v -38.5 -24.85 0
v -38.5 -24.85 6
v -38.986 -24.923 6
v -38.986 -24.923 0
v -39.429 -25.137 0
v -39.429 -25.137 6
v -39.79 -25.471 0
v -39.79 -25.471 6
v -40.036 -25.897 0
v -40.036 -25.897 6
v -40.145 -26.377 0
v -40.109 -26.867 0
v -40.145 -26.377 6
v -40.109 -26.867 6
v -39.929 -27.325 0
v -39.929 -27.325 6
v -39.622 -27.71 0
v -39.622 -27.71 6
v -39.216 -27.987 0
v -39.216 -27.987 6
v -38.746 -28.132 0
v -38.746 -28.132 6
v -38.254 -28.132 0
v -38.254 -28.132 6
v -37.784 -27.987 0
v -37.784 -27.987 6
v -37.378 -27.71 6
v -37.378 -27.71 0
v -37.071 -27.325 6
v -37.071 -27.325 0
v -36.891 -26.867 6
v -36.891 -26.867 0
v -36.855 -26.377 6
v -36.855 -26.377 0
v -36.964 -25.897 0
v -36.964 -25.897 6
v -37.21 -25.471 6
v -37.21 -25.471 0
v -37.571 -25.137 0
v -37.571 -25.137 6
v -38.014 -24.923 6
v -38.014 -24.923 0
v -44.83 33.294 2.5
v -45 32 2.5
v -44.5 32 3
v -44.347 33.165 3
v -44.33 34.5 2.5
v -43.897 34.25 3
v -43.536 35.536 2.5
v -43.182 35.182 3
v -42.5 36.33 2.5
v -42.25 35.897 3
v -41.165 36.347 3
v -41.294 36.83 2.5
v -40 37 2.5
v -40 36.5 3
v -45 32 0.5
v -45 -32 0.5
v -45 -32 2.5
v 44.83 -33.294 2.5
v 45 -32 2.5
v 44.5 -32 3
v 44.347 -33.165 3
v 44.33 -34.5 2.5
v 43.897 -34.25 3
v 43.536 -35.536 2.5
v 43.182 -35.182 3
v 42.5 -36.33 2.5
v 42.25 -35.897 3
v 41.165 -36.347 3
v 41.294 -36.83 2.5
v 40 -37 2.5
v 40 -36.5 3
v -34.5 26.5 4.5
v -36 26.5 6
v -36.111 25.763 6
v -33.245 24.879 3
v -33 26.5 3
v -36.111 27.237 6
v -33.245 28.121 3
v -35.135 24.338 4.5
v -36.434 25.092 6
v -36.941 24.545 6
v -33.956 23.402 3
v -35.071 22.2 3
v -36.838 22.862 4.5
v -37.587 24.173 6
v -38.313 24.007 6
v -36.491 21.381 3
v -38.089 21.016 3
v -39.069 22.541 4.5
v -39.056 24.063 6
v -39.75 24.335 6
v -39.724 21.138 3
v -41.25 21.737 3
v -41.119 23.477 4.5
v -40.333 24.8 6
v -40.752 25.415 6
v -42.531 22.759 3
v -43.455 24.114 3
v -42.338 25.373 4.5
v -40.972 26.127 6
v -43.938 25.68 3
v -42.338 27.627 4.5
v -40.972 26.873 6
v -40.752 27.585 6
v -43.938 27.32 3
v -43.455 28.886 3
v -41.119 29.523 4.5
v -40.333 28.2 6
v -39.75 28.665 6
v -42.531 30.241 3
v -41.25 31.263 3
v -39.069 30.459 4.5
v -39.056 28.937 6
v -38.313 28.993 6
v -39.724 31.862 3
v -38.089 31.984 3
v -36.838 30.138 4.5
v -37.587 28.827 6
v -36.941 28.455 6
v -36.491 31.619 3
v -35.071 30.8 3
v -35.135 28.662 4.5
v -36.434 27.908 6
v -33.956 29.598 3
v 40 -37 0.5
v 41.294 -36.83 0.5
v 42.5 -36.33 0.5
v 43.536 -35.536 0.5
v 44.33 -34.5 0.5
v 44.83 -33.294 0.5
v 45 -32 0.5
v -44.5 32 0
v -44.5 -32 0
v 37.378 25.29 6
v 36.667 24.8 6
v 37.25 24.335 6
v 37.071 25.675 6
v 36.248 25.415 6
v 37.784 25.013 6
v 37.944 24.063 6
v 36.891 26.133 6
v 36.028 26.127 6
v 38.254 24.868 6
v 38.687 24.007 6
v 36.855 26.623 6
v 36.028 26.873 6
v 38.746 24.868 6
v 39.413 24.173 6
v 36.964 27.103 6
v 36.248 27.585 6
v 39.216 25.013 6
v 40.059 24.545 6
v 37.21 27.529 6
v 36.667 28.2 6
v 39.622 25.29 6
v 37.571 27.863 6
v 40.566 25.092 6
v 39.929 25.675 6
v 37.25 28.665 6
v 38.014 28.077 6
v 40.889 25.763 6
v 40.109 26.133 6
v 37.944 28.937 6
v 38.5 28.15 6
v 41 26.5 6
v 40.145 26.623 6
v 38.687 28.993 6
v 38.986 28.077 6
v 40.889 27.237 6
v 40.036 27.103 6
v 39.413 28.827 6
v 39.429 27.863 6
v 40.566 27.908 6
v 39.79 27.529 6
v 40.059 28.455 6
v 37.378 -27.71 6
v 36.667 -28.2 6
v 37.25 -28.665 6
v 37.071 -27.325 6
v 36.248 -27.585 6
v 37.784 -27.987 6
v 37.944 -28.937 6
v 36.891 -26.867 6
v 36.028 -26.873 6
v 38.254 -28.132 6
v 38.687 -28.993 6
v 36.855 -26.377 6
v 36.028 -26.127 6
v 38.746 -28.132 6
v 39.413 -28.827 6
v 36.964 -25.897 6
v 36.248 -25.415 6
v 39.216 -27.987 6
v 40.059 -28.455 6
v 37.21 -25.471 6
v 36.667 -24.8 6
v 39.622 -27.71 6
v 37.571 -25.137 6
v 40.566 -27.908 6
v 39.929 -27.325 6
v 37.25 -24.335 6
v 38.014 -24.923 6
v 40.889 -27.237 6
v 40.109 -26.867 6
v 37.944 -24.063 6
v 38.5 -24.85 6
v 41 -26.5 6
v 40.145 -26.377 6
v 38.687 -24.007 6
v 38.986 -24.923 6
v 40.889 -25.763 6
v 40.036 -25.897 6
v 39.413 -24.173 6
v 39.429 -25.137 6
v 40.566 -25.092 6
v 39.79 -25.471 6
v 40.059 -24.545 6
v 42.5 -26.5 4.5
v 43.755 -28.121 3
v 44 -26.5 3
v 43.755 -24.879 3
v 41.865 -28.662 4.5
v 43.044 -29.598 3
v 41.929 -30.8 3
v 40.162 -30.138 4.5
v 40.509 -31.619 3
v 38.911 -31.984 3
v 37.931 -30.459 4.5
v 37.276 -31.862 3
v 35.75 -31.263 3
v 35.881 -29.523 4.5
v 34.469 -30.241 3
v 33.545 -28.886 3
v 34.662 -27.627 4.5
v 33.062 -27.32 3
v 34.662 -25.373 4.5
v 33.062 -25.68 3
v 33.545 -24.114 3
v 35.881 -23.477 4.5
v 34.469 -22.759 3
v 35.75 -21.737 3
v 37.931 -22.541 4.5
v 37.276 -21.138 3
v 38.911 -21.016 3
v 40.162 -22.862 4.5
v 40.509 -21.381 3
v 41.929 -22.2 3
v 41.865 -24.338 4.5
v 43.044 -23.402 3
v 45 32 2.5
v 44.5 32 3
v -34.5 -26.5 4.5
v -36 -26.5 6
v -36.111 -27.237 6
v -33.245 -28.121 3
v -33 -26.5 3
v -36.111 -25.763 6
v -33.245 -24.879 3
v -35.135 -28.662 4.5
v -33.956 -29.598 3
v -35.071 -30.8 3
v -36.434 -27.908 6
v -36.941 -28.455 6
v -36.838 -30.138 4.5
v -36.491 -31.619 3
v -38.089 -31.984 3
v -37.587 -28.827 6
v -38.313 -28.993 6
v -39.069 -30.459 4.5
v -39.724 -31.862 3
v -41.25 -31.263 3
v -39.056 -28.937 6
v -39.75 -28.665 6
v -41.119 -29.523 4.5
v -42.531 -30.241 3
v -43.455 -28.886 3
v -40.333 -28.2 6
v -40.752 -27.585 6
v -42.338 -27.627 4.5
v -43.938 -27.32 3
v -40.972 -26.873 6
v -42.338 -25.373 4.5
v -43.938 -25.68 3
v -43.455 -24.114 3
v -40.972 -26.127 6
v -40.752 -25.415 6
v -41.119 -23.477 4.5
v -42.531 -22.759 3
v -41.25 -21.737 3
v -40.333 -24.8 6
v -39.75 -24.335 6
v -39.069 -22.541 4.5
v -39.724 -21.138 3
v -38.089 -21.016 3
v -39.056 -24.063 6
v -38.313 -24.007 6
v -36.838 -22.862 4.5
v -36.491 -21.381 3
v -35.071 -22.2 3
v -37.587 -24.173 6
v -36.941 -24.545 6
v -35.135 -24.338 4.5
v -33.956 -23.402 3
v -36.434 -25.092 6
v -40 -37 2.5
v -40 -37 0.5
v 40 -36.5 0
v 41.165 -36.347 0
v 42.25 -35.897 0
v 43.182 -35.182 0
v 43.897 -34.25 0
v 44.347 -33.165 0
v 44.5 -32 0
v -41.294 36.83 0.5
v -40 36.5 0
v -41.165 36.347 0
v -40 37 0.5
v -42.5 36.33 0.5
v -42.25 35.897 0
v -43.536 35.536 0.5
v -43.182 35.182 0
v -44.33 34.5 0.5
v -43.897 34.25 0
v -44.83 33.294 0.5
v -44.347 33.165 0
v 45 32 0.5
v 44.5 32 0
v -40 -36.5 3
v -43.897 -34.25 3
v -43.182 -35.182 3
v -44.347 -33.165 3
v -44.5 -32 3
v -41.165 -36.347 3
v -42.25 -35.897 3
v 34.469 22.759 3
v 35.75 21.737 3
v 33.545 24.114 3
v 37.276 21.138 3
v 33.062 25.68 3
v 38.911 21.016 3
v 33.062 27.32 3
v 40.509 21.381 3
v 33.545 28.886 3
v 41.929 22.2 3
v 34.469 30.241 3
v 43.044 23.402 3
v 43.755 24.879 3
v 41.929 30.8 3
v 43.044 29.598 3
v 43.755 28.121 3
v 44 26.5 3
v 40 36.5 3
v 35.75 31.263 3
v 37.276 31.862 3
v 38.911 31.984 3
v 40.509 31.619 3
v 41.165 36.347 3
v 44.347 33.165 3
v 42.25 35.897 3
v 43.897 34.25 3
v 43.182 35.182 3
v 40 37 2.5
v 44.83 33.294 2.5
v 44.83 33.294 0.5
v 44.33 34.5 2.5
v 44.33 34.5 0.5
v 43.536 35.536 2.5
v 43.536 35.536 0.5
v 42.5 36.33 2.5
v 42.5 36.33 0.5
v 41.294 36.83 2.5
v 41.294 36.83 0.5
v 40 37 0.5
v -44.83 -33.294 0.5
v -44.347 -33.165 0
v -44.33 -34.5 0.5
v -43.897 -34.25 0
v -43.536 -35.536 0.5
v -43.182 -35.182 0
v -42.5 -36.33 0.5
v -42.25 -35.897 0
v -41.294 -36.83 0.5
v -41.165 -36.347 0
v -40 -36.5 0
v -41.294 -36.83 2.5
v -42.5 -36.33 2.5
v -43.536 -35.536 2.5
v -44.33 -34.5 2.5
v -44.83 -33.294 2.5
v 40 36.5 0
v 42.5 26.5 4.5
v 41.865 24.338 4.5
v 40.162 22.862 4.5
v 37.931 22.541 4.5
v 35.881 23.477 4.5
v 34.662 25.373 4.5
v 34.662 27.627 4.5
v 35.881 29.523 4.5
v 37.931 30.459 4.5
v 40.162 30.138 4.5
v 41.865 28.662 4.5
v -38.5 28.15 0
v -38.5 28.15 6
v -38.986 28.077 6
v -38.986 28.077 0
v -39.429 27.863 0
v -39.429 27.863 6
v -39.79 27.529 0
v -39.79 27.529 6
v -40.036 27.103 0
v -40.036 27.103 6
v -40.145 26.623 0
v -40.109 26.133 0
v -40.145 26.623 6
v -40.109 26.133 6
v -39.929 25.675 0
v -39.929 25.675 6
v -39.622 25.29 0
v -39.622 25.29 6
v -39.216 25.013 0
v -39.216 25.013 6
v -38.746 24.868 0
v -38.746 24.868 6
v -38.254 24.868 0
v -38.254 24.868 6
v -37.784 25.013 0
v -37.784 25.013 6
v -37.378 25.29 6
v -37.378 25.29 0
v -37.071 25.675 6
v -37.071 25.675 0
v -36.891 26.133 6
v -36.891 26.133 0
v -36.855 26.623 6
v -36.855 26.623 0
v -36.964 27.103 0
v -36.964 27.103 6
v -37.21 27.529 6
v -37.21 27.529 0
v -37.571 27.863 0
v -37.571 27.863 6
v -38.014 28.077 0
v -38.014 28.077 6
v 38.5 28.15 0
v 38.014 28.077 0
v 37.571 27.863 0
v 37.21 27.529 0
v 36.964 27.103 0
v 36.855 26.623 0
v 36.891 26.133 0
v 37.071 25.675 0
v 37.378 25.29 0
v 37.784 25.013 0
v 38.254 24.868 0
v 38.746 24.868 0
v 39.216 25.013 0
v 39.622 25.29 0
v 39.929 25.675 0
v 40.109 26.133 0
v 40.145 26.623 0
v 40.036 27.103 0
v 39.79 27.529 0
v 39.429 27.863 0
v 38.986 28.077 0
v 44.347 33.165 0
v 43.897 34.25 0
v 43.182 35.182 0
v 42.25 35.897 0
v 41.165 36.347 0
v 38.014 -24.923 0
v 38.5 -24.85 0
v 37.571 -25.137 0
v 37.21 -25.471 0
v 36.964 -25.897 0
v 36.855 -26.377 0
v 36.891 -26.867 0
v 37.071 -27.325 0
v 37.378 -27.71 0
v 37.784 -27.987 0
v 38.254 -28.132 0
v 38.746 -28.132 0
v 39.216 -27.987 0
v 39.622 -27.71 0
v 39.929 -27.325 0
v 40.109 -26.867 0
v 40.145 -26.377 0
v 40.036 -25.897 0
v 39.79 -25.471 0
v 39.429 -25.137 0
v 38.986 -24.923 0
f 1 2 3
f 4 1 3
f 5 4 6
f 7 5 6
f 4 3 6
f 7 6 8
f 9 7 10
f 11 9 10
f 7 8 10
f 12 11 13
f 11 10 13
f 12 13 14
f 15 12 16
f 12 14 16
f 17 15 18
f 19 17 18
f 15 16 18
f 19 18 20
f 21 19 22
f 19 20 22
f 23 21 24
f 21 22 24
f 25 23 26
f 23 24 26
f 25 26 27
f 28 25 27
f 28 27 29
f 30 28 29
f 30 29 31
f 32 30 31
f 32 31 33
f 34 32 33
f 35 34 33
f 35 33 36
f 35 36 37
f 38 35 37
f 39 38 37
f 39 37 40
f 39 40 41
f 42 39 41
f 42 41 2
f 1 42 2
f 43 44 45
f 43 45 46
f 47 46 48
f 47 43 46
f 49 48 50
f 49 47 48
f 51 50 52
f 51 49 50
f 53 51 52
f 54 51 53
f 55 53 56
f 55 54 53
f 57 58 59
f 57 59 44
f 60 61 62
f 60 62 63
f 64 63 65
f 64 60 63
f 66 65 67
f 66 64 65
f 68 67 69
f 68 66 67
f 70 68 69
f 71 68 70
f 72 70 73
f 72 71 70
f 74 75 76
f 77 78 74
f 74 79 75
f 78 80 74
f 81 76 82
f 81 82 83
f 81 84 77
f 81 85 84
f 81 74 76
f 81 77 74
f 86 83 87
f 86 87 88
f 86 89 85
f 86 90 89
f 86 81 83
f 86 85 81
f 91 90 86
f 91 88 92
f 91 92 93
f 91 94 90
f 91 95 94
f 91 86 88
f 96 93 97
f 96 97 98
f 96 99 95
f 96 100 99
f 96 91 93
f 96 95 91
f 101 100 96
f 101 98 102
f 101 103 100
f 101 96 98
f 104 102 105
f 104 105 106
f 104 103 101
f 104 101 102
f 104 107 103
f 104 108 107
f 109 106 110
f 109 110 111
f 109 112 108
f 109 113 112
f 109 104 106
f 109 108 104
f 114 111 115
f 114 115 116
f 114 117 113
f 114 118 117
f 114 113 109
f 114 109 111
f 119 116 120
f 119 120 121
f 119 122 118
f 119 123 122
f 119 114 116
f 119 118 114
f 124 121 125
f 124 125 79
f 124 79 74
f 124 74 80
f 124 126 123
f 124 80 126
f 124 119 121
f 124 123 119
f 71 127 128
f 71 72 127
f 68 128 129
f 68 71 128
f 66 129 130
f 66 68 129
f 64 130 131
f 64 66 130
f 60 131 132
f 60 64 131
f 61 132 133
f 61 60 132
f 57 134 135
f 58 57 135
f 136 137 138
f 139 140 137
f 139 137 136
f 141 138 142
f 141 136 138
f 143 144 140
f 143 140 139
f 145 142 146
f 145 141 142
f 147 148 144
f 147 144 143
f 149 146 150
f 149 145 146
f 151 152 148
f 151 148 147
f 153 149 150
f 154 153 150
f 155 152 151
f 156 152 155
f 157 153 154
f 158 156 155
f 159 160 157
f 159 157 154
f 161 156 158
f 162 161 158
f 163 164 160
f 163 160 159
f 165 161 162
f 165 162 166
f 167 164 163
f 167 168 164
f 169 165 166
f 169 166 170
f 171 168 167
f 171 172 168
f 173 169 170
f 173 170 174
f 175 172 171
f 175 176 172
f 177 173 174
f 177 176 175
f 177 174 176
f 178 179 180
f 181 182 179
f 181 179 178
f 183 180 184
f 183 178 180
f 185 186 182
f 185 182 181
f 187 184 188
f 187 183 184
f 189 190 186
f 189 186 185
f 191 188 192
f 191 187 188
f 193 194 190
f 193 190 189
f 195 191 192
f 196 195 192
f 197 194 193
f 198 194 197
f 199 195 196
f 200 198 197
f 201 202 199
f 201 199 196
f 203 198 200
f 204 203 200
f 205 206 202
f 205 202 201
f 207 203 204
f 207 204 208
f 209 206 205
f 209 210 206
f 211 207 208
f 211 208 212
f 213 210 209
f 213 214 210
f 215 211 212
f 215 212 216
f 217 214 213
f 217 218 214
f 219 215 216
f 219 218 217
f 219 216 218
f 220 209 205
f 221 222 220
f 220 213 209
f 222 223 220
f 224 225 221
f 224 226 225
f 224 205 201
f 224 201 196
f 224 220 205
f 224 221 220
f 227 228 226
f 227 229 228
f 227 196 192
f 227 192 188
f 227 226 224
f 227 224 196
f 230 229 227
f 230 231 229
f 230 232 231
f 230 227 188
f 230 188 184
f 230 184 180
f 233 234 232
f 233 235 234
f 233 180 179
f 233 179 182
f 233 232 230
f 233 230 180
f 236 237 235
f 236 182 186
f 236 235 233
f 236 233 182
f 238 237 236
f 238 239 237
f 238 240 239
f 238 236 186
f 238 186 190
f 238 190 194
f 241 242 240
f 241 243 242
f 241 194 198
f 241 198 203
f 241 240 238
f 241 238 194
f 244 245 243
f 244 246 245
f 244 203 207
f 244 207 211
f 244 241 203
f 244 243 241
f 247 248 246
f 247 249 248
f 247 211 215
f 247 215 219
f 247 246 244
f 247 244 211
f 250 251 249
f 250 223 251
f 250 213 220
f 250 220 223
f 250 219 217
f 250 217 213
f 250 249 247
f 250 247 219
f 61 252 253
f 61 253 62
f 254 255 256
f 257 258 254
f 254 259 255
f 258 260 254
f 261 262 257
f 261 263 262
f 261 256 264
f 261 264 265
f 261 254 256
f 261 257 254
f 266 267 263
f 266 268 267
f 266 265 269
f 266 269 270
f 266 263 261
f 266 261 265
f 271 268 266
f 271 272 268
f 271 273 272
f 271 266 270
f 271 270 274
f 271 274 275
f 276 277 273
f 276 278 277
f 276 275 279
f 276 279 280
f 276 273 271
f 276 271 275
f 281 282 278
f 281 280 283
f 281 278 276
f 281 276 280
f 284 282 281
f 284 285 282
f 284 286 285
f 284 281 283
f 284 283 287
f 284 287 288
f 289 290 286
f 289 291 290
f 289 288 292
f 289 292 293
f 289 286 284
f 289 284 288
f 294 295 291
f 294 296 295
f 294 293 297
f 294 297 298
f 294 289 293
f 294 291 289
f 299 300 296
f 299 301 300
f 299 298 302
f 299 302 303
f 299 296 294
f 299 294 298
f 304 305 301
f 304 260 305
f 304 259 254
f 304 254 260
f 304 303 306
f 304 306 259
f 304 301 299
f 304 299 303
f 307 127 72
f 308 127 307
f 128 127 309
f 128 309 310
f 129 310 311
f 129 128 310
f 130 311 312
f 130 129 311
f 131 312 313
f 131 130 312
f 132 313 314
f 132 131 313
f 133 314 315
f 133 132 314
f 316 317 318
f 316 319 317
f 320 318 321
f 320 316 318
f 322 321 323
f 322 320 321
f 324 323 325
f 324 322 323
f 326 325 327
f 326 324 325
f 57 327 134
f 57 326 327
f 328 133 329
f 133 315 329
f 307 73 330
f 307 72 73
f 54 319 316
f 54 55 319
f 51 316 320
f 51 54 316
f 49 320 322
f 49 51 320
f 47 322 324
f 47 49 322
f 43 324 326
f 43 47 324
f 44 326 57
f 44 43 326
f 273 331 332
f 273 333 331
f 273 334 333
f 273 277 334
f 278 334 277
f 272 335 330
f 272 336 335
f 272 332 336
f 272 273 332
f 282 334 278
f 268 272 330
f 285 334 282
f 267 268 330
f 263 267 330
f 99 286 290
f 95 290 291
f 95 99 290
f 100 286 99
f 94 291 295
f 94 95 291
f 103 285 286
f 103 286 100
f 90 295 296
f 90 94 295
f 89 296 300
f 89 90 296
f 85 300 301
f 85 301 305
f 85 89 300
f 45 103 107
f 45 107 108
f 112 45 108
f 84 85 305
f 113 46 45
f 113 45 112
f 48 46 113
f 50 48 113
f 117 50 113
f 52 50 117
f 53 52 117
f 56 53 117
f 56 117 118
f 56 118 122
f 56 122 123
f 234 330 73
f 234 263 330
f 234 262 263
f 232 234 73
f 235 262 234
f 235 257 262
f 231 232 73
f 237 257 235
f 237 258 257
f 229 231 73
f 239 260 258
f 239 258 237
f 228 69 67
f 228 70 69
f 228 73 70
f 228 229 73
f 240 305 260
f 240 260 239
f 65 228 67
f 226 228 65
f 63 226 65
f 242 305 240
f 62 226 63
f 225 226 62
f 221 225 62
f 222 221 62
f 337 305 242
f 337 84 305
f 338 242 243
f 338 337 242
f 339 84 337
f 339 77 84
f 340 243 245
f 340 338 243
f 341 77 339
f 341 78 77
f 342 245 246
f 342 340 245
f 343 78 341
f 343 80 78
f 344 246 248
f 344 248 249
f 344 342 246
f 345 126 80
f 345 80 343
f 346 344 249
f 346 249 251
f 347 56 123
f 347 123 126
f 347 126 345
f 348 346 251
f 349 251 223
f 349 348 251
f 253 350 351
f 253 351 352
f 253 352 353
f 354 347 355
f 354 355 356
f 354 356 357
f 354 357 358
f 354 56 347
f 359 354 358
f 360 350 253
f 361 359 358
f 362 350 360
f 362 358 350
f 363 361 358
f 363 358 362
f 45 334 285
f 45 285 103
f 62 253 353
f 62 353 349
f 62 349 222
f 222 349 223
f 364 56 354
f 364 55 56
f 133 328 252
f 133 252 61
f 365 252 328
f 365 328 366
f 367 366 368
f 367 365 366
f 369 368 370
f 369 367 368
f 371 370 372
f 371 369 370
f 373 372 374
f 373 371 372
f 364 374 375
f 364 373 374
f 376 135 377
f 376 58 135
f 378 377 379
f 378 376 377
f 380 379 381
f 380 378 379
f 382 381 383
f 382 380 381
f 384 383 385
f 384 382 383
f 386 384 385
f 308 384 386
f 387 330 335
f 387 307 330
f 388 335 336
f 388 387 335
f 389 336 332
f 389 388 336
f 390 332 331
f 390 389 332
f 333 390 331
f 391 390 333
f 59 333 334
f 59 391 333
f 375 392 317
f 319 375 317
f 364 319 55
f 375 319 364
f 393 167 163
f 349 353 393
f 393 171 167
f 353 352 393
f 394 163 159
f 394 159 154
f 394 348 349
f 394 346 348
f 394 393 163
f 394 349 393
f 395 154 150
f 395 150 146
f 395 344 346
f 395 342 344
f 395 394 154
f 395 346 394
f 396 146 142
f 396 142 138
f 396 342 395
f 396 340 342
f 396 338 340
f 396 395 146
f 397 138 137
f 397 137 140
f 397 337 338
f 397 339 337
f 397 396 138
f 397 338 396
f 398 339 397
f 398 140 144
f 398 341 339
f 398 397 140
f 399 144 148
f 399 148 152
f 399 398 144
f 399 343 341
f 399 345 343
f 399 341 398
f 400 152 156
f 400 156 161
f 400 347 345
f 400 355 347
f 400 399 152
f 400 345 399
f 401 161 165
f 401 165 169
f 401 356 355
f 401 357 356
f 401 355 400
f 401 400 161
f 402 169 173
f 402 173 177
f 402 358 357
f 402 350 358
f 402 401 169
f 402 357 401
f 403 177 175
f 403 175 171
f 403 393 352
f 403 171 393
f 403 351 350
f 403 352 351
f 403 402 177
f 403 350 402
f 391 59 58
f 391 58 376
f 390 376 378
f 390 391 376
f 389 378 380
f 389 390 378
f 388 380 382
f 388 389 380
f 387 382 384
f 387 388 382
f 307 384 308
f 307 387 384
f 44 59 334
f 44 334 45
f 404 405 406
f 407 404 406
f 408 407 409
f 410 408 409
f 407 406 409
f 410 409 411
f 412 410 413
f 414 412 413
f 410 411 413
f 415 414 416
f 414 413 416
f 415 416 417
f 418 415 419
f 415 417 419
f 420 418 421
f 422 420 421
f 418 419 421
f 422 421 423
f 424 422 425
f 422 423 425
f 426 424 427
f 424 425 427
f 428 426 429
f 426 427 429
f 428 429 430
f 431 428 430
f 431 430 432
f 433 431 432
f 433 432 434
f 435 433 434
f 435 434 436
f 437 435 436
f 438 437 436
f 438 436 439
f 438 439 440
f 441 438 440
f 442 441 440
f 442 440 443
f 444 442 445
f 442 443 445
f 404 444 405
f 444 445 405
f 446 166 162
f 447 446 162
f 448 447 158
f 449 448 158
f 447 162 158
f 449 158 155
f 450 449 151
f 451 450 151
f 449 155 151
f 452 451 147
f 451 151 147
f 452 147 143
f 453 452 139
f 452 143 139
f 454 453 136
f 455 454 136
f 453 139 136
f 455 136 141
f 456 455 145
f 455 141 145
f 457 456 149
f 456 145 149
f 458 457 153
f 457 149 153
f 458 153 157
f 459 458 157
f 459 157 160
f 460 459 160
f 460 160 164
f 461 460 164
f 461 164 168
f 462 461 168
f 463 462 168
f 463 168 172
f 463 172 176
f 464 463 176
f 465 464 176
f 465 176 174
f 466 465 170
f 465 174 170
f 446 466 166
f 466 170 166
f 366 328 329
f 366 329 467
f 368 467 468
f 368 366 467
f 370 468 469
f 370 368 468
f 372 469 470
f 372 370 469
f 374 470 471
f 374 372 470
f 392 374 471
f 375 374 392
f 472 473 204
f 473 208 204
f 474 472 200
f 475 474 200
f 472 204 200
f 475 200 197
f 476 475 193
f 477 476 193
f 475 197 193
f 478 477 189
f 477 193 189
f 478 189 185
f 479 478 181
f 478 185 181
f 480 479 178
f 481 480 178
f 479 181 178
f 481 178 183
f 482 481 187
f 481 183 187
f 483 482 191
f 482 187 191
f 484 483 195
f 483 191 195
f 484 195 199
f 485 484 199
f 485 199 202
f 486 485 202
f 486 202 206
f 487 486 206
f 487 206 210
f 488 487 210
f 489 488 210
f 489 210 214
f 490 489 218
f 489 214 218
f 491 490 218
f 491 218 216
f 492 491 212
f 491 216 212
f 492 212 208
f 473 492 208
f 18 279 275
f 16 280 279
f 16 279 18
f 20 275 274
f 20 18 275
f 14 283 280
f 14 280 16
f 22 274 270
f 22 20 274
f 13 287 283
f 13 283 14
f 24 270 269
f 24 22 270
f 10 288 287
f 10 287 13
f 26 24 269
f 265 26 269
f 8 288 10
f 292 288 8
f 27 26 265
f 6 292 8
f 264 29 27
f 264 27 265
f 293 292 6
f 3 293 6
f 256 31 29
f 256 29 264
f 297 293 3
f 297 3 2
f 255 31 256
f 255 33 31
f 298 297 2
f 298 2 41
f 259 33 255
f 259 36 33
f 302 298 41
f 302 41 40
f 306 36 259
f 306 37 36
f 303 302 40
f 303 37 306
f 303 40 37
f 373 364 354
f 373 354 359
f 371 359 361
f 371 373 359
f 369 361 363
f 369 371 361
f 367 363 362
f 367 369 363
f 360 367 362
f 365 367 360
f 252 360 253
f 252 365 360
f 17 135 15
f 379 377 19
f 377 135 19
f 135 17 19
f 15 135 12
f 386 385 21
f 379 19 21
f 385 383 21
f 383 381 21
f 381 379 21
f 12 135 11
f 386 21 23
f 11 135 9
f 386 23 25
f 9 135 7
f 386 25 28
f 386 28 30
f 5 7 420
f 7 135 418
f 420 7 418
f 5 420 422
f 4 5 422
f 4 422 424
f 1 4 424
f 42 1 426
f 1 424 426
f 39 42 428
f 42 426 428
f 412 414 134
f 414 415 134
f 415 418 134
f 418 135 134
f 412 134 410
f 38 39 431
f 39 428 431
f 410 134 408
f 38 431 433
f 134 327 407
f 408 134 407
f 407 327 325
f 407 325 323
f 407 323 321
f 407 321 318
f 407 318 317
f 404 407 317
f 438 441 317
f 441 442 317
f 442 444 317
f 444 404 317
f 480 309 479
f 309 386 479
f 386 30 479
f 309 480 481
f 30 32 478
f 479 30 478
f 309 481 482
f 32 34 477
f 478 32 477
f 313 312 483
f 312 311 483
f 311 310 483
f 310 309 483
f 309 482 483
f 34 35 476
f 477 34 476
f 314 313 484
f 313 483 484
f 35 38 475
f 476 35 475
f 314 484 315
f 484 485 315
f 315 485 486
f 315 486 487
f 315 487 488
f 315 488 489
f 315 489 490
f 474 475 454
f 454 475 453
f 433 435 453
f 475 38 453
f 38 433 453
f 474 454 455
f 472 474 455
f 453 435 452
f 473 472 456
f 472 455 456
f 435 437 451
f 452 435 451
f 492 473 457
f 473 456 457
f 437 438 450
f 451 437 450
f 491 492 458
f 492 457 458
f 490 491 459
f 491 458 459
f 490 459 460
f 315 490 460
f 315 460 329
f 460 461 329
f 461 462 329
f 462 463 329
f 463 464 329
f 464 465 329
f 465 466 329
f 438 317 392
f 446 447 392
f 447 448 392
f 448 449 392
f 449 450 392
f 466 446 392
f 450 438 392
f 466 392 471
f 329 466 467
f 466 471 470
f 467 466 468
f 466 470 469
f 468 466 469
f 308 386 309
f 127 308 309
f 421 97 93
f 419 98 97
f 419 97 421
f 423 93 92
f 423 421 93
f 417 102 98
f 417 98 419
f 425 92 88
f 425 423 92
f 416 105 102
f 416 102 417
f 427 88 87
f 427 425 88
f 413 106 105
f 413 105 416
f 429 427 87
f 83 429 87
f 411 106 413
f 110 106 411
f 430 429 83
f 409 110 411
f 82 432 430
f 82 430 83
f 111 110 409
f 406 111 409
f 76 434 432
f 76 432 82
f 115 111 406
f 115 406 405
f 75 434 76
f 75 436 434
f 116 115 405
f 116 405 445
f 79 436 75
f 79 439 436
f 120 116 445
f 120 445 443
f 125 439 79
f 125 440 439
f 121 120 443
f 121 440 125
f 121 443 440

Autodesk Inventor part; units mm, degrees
ref_plane "YZ Plane" through (0, 0, 0) normal (1, 0, 0) x (0, 1, 0)
ref_plane "XZ Plane" through (0, 0, 0) normal (0, 1, 0) x (-1, 0, 0)
ref_plane "XY Plane" through (0, 0, 0) normal (0, 0, 1) x (1, 0, 0)
sketch "Sketch1" plane through (0, 0, 0) normal (0, 0, 1) x (1, 0, 0)
  line L0 (-45, 37) -> (45, 37)
  line L1 (45, 37) -> (45, -37)
  line L2 (45, -37) -> (-45, -37)
  line L3 (-45, -37) -> (-45, 37)
  line L4 (-38.5, 26.5) -> (38.5, 26.5) construction
  line L5 (38.5, 26.5) -> (38.5, -26.5) construction
  line L6 (38.5, -26.5) -> (-38.5, -26.5) construction
  line L7 (-38.5, -26.5) -> (-38.5, 26.5) construction
  circle A0 centre (-38.5, 26.5) radius 2.5
  circle A1 centre (38.5, 26.5) radius 2.5
  circle A2 centre (38.5, -26.5) radius 2.5
  circle A3 centre (-38.5, -26.5) radius 2.5
  point P0 (0, 0)
  point P1 (45, 0)
  point P2 (0, 37)
  point P3 (38.5, 0)
  point P4 (0, 26.5)
  dimension "d0" = 90
  dimension "d1" = 74
  dimension "d2" = 77
  dimension "d3" = 53
  dimension "d14" = 5
extrude "Extrusion1" add sketch "Sketch1" along normal blind 3 contours L0 L1 L2 L3 | A0 | A1 | A2 | A3
extrude "Extrusion2" add sketch "Sketch1" along normal blind 6 contours A0 | A1 | A2 | A3
chamfer "Chamfer1" distance 3 angle 45 4 edges at (-41, 26.5, 3) (36, 26.5, 3) (36, -26.5, 3) (-41, -26.5, 3)
hole "Hole1" at (38.5, 26.5, 0) at (38.5, -26.5, 0) at (-38.5, -26.5, 0) at (-38.5, 26.5, 0) direction (0, 0, 1) diameter 3.3 end through all
fillet "Fillet1" radius 5 4 edges at (45, 37, 1.5) (45, -37, 1.5) (-45, -37, 1.5) (-45, 37, 1.5)
chamfer "Chamfer2" distance 0.5 angle 45 9 edges at (0, 37, 0) (-43.5355, 35.5355, 0) (-45, 0, 0) (-43.5355, -35.5355, 0) (0, -37, 0) (43.5355, -35.5355, 0) (45, 0, 0) (43.5355, 35.5355, 0) (0, 37, 3)
equation "\"d0\" = length"
equation "\"d1\" = width"
equation "\"d4\" = thickness"
equation "\"d15\" = thickness + bump"
equation "\"width\" = 74"
equation "\"length\" = 90"
equation "\"thickness\" = 3"
equation "\"bump\" = 3"
properties part number "temp-logger-base-plate" material "ABS Plastic"
